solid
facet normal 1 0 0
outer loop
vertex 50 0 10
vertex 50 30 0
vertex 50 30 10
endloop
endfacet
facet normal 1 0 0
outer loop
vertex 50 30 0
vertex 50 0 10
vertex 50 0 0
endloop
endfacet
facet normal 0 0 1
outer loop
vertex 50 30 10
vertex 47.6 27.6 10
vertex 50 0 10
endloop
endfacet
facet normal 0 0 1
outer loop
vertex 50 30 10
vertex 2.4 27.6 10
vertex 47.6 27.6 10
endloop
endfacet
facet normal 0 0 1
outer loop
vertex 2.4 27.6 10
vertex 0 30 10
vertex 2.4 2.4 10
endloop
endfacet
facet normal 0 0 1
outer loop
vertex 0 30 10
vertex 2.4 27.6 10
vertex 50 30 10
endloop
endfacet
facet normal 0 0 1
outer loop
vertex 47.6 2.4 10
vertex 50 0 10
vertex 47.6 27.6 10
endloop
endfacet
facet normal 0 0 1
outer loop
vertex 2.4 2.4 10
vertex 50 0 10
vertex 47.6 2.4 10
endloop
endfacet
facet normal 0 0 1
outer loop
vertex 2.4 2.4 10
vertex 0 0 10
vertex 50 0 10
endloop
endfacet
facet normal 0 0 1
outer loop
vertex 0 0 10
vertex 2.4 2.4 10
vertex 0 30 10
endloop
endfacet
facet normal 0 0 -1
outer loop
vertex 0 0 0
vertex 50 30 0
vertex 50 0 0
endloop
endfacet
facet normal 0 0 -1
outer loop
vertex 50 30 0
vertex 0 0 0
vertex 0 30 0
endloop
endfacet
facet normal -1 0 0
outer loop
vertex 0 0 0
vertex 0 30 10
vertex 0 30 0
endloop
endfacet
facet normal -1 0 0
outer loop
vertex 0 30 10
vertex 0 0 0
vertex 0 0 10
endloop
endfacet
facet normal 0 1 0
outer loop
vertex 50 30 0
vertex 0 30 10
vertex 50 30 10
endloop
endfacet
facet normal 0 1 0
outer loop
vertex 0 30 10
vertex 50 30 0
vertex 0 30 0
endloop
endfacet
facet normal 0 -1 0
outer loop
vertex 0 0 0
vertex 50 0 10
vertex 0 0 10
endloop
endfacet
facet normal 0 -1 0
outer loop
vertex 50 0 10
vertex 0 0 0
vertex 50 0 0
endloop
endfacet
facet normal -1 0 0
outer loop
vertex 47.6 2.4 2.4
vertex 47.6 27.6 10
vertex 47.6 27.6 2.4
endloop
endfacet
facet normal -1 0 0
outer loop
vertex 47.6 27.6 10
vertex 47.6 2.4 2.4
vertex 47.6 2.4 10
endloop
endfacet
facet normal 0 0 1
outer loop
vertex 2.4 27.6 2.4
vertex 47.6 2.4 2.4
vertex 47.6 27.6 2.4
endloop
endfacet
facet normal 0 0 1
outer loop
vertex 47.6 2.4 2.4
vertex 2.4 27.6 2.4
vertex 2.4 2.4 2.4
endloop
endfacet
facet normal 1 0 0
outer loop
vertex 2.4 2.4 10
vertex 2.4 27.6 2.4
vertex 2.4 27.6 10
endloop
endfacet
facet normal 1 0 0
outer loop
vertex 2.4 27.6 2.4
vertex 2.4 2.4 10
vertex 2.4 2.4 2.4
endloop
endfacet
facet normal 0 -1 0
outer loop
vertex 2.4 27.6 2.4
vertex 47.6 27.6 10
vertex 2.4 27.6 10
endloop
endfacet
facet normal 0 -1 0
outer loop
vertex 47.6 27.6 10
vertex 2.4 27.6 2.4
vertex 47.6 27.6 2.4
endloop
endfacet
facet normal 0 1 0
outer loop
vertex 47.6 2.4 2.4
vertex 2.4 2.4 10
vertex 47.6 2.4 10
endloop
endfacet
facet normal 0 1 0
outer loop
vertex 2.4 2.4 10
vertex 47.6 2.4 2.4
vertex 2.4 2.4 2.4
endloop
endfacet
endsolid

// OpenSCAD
// Project name — parametric model
// Units: mm

/* [Dimensions] */
width     = 50;
depth     = 30;
height    = 10;
wall      = 2.4;   // >= 1.2 for most print services

/* [Fit] */
clearance = 0.2;   // hole/slot clearance for printed parts

/* [Quality] */
$fn = 64;

module part() {
    difference() {
        cube([width, depth, height]);
        translate([wall, wall, wall])
            cube([width - 2*wall, depth - 2*wall, height]);
    }
}

part();

// Export: openscad -o ../exports/part.stl model.scad
